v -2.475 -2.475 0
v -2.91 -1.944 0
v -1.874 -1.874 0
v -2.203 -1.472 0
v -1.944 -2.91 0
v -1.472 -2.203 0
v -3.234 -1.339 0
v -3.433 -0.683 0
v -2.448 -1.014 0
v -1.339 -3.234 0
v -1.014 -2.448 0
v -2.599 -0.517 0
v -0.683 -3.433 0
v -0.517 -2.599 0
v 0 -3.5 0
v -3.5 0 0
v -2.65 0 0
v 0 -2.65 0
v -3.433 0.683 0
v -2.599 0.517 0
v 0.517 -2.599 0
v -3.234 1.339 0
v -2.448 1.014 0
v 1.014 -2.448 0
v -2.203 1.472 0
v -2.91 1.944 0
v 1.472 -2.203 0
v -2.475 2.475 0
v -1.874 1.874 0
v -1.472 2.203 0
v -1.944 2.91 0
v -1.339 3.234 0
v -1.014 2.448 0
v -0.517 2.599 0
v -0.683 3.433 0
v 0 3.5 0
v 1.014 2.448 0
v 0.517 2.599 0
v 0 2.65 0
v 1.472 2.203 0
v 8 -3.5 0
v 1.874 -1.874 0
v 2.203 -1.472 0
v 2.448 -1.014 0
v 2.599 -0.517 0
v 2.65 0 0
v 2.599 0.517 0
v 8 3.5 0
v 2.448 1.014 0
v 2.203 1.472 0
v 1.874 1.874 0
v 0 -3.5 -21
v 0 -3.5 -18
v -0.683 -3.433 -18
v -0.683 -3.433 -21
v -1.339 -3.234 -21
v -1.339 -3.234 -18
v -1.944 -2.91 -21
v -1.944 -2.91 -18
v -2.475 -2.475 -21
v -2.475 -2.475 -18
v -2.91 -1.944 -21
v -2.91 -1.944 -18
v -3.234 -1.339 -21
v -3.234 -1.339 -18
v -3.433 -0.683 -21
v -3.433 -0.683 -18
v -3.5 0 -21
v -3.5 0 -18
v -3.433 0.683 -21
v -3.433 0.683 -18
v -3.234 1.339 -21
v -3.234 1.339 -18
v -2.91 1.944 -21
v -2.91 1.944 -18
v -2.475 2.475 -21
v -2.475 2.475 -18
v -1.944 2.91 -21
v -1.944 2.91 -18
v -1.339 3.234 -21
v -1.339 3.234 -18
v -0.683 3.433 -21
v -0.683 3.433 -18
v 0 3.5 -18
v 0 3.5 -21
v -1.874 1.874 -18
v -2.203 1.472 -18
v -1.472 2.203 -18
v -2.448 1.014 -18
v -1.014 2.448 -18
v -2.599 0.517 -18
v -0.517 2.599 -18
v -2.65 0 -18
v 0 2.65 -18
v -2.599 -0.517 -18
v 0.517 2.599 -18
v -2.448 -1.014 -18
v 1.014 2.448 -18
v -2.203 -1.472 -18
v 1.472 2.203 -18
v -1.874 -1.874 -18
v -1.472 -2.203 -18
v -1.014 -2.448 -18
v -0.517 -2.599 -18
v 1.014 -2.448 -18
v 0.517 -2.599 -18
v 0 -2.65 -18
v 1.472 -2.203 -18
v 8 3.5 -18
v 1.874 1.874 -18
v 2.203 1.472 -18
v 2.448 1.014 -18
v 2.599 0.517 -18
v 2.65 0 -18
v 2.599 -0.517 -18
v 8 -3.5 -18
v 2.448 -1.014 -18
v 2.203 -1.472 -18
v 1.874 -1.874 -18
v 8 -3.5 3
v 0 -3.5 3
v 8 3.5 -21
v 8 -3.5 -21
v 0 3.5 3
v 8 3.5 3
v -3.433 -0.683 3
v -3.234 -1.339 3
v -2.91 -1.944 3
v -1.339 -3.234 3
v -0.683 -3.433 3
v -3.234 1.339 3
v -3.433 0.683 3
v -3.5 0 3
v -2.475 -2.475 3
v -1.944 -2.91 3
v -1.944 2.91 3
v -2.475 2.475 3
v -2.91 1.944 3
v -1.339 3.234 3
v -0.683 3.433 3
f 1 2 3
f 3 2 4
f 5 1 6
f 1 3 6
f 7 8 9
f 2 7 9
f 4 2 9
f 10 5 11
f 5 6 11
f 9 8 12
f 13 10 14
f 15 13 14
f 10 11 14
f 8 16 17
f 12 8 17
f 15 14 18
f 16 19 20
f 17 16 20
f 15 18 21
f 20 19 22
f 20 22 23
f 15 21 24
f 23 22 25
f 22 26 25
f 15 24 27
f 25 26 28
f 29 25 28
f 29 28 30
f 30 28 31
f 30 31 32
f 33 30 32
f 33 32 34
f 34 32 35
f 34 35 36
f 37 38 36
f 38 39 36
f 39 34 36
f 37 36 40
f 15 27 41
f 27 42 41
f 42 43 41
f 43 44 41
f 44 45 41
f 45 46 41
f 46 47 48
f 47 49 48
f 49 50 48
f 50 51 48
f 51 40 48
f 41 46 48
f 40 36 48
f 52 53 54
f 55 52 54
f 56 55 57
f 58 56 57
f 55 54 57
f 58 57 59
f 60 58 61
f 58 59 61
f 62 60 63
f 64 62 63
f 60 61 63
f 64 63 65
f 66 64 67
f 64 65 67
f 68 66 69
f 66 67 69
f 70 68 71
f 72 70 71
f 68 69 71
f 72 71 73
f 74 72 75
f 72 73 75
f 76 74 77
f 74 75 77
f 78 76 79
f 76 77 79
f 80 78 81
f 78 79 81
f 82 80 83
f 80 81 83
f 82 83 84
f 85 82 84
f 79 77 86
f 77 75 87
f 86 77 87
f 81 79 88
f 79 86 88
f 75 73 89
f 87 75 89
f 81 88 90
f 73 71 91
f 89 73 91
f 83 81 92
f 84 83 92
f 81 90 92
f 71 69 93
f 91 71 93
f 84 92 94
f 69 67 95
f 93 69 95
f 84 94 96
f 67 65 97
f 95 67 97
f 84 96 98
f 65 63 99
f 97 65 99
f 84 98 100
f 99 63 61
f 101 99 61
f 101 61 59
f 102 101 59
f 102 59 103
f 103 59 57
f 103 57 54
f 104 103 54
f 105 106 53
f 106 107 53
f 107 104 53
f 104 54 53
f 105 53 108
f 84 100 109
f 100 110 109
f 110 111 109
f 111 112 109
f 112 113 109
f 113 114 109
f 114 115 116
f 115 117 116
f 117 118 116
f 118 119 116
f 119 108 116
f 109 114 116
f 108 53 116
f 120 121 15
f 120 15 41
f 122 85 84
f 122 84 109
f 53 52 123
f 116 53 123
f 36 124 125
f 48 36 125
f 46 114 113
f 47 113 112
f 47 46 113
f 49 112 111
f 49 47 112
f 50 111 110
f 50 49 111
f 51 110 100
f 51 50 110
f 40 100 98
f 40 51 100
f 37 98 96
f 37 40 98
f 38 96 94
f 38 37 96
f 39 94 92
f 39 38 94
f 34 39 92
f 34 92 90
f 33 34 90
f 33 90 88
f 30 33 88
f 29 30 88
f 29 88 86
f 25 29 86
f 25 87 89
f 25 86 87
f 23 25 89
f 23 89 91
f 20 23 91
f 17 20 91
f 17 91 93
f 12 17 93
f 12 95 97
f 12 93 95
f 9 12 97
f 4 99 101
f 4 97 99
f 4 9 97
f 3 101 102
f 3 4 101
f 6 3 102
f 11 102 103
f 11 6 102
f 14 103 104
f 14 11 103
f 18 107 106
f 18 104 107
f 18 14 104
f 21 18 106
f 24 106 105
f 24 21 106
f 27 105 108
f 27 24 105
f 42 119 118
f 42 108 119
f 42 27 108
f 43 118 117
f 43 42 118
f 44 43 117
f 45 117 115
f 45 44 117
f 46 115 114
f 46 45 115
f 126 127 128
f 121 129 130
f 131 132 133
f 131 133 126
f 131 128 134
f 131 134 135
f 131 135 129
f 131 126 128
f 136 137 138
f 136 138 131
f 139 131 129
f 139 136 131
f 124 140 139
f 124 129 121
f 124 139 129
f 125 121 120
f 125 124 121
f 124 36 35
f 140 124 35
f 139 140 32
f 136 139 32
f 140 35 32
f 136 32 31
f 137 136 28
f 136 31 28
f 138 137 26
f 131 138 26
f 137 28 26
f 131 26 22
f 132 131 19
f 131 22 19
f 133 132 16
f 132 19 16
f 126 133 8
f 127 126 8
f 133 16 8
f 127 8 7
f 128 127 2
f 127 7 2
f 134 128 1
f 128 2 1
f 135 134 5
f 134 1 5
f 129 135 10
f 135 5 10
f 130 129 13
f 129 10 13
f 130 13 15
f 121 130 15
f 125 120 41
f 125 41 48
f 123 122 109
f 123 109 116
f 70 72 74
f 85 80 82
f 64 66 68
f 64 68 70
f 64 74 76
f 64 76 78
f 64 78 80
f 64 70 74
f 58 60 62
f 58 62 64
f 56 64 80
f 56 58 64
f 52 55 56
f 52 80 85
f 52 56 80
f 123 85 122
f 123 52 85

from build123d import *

# Parameters (mm, degrees)
F0_R     = 2.65
F1_DEPTH = 18
F2_R     = 3.5
F3_DEPTH = 3
F4_R     = 3.5
F5_DEPTH = 3
F6_W     = 8
F6_H     = 7
F7_DEPTH = 3
F8_W     = 8
F8_H     = 7
F9_DEPTH = 3


with BuildPart() as f1:
    # F0 (on Top) → F1 (new body)
    with BuildSketch(Plane.XY):
        Circle(F0_R)
    extrude(amount=-F1_DEPTH)

    # F2 (on face) → F3 (join)
    with BuildSketch(Plane.XY):
        Circle(F2_R)
    extrude(amount=F3_DEPTH)

    # F4 (on face) → F5 (join)
    with BuildSketch(Plane(origin=(0, 0, -18), x_dir=(1, 0, 0), z_dir=(0, 0, -1))):
        Circle(F4_R)
    extrude(amount=F5_DEPTH)

    # F6 (on face) → F7 (join)
    with BuildSketch(Plane(origin=(0, 0, -21), x_dir=(1, 0, 0), z_dir=(0, 0, -1))):
        with Locations((4, 0)):
            Rectangle(F6_W, F6_H)
    extrude(amount=-F7_DEPTH)

    # F8 (on face) → F9 (join)
    with BuildSketch(Plane.XY.offset(3)):
        with Locations((4, 0)):
            Rectangle(F8_W, F8_H)
    extrude(amount=-F9_DEPTH)


solid = f1.part
